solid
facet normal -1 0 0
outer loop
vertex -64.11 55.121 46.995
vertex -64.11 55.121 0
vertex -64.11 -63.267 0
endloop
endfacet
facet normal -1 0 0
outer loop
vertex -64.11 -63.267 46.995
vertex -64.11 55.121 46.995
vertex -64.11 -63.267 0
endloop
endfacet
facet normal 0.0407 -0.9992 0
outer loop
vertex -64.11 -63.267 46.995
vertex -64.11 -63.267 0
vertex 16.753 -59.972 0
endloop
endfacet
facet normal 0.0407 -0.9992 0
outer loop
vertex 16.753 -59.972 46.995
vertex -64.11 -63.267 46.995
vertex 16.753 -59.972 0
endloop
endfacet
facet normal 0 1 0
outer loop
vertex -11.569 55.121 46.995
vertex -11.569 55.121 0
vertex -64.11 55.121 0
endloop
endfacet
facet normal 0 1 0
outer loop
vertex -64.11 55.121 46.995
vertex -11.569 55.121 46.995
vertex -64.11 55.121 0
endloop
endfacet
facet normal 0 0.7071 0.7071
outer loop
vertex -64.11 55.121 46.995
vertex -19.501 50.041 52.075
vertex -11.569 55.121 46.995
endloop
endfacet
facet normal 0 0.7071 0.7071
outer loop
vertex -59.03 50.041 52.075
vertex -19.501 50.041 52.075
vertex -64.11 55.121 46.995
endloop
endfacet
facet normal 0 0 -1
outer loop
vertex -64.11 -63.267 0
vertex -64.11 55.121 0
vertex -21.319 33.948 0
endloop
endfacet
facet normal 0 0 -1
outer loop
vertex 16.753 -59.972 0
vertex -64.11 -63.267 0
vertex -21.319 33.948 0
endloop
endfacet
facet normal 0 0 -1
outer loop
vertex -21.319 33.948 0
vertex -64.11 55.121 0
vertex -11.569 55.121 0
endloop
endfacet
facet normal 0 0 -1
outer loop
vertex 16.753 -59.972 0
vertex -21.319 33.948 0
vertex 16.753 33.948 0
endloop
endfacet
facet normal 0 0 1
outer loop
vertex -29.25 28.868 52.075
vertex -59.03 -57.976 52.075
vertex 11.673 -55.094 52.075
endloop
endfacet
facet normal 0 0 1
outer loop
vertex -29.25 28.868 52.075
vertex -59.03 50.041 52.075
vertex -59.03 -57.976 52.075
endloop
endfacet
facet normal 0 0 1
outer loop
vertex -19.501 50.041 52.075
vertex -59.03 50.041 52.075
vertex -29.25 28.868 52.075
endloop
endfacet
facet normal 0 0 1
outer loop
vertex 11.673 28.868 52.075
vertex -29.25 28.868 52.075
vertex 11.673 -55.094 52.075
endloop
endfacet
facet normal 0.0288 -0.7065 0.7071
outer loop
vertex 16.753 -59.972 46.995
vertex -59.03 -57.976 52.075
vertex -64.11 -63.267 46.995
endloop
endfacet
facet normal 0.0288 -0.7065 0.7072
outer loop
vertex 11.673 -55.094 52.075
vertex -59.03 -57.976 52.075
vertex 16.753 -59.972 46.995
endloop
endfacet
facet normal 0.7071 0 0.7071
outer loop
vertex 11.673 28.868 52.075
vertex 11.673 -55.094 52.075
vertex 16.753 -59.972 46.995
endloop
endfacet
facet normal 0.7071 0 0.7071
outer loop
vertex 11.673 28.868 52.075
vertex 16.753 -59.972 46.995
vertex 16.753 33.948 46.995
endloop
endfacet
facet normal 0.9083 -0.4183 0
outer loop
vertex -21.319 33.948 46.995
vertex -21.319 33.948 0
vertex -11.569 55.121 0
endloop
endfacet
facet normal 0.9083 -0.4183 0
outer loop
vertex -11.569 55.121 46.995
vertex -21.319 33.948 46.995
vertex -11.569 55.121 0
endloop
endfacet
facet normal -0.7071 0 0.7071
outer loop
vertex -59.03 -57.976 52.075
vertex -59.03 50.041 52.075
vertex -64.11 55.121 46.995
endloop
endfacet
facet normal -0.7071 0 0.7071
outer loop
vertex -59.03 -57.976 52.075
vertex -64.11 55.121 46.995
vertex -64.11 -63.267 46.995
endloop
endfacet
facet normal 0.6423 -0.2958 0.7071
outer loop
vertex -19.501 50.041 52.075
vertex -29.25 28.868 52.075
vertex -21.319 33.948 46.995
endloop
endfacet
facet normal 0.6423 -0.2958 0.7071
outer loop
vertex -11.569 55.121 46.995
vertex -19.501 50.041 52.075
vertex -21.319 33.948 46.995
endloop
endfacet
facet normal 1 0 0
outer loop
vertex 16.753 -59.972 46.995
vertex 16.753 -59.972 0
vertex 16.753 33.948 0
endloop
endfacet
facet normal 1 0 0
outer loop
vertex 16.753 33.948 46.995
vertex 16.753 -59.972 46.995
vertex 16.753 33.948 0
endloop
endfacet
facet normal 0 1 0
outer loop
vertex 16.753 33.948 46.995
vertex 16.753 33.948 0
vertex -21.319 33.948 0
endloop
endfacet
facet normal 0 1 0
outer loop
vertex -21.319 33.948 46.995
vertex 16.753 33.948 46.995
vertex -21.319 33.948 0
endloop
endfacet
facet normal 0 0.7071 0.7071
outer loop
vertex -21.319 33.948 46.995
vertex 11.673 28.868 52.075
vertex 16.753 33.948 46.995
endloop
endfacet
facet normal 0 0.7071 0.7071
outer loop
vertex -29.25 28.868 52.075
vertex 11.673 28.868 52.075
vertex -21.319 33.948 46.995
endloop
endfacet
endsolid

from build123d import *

# Parameters (mm, degrees)
F1_DEPTH = 52.07476
F2_SIZE  = 5.08


with BuildPart() as f1:
    # F0 (on Top) → F1 (new body)
    with BuildSketch(Plane.XY):
        Polygon((-64.110152, 55.120572), (-64.110152, -63.26732), (16.753428, -59.971586), (16.753428, 33.947513), (-21.318547, 33.947513), (-11.569425, 55.120572), align=None)
    extrude(amount=F1_DEPTH)

    # F2
    f2_edges = [f1.edges().sort_by_distance(p)[0] for p in [
        (-23.678362, -61.619453, 52.07476),
        (-64.110152, -4.073374, 52.07476),
        (16.753428, -13.012037, 52.07476),
        (-2.28256, 33.947513, 52.07476),
        (-16.443986, 44.534042, 52.07476),
        (-37.839789, 55.120572, 52.07476),
    ]]
    chamfer(f2_edges, length=F2_SIZE)


solid = f1.part
